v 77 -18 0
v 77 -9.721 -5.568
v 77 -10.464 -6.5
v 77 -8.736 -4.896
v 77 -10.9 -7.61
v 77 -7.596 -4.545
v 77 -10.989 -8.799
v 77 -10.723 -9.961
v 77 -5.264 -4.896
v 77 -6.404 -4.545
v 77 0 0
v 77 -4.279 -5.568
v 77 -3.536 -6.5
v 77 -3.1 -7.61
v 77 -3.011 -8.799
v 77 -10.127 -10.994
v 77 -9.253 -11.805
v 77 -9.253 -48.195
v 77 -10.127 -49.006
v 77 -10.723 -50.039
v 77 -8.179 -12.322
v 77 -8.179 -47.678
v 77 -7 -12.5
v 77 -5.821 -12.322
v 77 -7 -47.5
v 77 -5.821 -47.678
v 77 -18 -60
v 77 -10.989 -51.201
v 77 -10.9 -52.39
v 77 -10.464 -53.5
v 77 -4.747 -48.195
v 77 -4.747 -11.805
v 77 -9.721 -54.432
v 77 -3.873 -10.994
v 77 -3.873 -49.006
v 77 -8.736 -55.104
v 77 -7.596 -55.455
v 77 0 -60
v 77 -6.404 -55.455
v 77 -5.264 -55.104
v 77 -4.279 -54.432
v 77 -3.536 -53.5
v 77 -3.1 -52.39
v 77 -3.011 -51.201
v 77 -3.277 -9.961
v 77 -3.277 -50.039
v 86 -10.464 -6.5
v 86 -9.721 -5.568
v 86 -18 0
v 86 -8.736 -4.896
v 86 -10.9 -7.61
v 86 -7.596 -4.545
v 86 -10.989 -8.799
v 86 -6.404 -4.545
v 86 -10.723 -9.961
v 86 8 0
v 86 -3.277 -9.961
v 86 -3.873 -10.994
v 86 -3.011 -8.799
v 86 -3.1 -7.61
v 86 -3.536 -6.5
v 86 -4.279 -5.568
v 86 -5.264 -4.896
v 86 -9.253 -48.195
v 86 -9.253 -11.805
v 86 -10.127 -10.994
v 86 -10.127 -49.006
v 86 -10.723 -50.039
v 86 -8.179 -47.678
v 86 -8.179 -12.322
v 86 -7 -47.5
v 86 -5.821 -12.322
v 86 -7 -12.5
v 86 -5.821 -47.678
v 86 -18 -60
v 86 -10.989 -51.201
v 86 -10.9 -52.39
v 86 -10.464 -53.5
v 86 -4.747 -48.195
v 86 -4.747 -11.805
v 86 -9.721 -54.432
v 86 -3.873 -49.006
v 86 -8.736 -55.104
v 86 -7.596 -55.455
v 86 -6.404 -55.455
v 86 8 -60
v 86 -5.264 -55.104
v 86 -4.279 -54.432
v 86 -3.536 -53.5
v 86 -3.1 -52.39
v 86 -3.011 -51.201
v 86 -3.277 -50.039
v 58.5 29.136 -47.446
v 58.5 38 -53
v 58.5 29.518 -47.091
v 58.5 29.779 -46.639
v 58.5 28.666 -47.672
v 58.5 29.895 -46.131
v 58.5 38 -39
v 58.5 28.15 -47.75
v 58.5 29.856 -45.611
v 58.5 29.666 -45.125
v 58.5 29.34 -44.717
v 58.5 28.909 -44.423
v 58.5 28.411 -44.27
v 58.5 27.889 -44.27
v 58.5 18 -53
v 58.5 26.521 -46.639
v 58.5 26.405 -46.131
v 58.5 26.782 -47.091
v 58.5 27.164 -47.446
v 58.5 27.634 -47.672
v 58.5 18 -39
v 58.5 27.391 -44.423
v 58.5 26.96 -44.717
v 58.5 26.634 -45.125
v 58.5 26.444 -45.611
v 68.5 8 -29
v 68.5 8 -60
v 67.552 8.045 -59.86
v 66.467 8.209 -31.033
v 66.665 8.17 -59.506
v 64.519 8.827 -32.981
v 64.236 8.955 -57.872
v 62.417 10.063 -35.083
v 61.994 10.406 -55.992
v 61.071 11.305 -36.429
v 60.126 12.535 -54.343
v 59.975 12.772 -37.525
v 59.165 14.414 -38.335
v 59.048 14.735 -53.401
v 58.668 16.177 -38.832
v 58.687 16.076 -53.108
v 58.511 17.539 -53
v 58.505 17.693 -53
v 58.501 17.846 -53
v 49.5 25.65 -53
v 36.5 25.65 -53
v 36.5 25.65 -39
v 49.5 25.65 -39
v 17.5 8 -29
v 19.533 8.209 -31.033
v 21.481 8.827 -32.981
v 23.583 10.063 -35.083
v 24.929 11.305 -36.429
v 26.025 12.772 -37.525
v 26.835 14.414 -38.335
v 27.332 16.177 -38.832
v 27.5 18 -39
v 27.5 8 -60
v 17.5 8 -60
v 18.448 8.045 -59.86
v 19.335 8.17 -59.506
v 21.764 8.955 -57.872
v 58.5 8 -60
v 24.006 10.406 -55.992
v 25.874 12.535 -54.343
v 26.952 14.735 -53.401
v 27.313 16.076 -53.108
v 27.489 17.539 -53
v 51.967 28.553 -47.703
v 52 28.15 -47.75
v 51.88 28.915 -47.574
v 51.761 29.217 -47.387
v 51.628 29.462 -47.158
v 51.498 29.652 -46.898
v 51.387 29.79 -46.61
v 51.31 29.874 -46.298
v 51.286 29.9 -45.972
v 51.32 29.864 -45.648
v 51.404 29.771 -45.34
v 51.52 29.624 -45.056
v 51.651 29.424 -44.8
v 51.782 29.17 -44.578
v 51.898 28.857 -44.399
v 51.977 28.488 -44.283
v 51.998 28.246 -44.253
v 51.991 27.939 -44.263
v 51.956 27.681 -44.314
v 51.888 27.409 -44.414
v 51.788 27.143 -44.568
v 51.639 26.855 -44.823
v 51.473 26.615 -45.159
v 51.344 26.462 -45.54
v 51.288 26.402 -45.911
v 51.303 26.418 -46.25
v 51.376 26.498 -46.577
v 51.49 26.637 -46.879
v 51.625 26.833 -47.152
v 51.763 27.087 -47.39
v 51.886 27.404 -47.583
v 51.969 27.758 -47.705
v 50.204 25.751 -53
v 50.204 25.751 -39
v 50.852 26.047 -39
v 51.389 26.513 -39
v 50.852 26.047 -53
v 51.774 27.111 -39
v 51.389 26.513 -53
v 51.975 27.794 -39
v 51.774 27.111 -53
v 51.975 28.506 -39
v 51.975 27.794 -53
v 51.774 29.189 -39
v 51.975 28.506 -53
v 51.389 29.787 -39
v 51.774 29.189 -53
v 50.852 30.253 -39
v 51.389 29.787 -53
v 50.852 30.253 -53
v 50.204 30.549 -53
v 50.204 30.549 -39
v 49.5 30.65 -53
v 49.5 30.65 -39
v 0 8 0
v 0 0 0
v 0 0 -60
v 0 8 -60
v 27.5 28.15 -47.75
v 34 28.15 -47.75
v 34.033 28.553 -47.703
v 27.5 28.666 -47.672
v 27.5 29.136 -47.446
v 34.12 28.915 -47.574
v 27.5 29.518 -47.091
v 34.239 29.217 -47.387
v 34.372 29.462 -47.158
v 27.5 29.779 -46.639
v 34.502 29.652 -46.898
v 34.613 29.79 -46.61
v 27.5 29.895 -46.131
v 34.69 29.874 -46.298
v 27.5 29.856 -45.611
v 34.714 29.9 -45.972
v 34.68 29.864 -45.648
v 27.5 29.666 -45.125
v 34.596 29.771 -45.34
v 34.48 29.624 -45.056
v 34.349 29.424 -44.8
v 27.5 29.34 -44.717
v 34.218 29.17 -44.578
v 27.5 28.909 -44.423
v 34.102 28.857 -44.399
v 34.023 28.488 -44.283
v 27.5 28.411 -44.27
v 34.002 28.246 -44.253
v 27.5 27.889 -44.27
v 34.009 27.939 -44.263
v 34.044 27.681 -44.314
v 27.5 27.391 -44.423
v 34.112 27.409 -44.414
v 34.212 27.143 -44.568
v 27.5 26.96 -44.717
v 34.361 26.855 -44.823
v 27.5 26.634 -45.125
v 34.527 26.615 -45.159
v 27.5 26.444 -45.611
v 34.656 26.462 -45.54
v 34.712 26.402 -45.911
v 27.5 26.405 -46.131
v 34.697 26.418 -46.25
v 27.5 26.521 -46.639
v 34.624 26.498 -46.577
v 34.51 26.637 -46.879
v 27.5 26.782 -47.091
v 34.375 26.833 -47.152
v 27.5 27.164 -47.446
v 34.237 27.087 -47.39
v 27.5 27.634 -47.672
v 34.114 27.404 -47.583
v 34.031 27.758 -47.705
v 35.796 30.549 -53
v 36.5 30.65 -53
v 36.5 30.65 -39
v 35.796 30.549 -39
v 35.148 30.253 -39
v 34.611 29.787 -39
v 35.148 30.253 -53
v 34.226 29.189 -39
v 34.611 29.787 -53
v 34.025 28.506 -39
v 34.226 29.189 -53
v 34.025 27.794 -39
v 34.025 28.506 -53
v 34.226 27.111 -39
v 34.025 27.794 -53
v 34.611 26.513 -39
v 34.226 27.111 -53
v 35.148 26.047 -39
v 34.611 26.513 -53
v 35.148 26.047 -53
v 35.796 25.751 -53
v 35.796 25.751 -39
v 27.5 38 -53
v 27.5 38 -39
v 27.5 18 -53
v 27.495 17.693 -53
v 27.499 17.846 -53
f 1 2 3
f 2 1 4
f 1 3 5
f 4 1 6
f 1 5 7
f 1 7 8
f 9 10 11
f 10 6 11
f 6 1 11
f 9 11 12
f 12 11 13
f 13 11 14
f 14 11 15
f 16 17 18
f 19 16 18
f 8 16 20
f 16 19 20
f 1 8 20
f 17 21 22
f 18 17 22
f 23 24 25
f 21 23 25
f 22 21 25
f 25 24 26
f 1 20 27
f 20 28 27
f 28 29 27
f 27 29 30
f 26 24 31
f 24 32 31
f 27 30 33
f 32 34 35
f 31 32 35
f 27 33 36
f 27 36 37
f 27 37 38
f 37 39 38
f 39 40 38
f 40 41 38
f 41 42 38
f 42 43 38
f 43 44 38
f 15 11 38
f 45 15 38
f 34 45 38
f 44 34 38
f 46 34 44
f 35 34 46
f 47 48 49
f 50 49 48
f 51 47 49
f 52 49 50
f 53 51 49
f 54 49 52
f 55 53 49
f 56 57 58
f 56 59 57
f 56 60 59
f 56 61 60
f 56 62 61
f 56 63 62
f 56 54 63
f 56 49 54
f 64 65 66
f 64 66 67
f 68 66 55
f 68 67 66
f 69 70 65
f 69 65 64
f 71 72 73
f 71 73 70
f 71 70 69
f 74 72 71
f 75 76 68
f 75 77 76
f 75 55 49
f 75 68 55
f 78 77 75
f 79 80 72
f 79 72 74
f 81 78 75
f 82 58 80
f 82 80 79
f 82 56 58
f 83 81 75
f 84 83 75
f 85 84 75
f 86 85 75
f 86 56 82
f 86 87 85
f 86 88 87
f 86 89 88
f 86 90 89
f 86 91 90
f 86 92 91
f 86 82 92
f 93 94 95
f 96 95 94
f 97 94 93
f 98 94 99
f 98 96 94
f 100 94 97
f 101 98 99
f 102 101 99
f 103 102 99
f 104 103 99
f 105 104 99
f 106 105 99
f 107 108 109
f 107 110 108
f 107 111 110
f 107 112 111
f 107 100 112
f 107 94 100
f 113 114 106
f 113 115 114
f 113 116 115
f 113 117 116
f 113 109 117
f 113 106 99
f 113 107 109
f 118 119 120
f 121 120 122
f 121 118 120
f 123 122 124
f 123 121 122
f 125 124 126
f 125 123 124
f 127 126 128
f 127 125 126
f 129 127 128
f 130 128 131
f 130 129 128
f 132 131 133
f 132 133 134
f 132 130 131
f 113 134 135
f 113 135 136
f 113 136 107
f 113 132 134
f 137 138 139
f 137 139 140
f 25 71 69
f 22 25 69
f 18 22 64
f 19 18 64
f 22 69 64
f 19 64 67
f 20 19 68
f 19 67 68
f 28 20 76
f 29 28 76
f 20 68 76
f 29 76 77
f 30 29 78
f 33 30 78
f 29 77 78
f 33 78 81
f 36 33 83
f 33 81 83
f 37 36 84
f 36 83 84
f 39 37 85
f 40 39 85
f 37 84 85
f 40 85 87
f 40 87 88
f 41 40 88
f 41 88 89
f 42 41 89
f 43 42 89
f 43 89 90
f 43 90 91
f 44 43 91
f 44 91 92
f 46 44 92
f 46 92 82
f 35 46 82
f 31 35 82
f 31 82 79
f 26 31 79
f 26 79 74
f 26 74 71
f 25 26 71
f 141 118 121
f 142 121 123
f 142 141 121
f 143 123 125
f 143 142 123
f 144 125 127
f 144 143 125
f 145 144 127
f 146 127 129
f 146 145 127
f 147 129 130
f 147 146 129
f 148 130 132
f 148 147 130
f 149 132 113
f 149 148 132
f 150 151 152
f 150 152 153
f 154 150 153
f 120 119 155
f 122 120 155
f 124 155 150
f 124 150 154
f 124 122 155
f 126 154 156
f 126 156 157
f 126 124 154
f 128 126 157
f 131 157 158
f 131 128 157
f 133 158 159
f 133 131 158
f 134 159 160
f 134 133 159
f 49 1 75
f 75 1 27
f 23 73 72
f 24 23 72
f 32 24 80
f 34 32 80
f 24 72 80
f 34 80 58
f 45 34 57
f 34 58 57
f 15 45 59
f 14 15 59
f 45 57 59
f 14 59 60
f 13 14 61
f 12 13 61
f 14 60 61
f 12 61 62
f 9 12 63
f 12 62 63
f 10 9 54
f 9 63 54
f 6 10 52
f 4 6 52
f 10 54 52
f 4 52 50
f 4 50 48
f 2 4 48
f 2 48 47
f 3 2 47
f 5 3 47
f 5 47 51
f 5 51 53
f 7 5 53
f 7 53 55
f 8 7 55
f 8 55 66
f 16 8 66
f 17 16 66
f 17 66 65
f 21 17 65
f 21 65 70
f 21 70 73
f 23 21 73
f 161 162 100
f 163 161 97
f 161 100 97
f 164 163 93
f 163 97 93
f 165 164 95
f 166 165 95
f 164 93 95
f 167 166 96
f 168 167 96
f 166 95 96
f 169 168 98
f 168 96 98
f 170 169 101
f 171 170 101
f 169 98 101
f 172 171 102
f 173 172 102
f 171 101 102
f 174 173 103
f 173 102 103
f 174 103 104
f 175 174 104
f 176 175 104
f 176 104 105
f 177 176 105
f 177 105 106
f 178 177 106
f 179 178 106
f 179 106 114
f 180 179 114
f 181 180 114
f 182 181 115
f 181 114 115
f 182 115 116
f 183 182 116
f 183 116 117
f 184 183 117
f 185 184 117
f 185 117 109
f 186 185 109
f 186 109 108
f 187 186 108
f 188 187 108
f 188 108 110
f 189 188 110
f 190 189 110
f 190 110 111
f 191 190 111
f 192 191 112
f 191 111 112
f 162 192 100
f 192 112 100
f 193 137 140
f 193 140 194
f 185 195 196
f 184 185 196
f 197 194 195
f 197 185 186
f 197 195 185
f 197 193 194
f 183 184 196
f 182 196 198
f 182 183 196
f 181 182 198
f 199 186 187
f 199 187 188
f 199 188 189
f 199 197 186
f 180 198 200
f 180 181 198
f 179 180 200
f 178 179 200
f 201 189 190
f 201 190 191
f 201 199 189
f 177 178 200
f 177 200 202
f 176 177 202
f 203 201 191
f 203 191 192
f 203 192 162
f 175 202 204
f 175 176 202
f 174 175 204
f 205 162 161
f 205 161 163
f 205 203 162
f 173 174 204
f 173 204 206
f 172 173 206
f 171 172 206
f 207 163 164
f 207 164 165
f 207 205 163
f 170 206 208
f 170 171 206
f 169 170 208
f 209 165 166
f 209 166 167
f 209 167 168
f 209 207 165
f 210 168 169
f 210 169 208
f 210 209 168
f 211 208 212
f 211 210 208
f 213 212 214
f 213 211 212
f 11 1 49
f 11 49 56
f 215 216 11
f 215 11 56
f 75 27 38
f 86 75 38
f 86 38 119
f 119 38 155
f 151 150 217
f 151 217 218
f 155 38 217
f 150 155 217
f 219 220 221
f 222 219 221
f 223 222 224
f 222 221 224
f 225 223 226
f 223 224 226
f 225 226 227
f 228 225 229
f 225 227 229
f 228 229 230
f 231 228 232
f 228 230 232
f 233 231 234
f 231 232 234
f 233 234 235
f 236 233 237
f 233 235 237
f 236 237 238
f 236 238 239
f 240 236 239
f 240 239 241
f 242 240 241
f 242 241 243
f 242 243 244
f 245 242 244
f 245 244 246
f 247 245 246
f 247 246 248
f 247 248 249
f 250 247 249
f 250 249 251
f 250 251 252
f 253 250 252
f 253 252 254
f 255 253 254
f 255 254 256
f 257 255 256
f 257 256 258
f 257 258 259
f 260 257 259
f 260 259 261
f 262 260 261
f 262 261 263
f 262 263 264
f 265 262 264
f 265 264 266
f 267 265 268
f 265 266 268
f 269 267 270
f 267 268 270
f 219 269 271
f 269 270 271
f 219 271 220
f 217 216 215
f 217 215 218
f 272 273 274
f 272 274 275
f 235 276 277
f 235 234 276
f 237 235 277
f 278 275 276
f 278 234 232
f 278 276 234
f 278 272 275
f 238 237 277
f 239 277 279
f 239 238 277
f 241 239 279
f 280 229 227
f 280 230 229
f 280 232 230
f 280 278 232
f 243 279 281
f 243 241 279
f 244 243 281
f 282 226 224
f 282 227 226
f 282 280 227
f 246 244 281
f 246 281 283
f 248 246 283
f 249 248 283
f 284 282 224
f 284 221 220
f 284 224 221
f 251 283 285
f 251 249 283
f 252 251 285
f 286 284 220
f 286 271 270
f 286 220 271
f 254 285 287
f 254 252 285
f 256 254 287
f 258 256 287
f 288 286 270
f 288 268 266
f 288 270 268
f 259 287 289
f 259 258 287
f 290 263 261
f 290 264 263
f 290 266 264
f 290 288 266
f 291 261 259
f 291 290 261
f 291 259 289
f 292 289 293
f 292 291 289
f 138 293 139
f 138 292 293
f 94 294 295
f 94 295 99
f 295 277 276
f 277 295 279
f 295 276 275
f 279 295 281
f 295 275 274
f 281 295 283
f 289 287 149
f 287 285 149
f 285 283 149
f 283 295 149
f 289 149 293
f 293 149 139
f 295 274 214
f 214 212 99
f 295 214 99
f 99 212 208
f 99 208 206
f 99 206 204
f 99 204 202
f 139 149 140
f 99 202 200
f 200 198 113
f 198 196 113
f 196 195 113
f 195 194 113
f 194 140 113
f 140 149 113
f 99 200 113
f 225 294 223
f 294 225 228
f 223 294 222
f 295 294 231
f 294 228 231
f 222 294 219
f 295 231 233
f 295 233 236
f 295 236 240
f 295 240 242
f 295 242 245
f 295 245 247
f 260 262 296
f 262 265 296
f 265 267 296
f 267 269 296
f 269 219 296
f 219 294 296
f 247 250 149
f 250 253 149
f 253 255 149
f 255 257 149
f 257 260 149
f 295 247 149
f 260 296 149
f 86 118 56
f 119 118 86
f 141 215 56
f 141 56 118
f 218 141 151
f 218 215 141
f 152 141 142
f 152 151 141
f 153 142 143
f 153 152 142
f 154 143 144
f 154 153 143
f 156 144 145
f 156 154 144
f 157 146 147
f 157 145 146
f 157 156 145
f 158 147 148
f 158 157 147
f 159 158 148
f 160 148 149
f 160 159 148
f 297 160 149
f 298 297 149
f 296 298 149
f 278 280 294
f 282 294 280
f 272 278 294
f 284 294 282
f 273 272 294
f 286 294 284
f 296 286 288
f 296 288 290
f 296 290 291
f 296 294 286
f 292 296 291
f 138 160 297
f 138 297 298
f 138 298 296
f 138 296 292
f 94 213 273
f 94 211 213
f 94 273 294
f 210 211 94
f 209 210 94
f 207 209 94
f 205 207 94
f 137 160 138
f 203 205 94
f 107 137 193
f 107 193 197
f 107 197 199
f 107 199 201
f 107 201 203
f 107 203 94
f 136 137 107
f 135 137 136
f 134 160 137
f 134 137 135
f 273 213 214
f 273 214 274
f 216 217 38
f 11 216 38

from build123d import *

# Parameters (mm, degrees)
SKETCH1_W                               = 77
SKETCH1_H                               = 60
BOSS_EXTRUDE1_DEPTH                     = 8
SKETCH3_W                               = 60
SKETCH3_H                               = 26
BOSS_EXTRUDE2_DEPTH                     = 9
SKETCH4_R                               = 4
CUT_EXTRUDE2_DEPTH                      = 107.395488626
SKETCH5_W                               = 31
SKETCH5_H                               = 14
BOSS_EXTRUDE3_DEPTH                     = 30
CUT_EXTRUDE3_DEPTH                      = 108.930533215
FILLET1_R                               = 10
SKETCH8_R                               = 1.75
F_3_5MM_SCREW_HOLE_FOR_TENSIONING_DEPTH = 93.012227514


with BuildPart() as part:
    # Sketch1 → Boss-Extrude1 (new body)
    with BuildSketch(Plane(origin=(0, 0, 0), x_dir=(1, 0, 0), z_dir=(0, 1, 0))):
        with Locations((38.5, 30)):
            Rectangle(SKETCH1_W, SKETCH1_H)
    extrude(amount=BOSS_EXTRUDE1_DEPTH)

    # Sketch3 → Boss-Extrude2 (add)
    with BuildSketch(Plane(origin=(77, 0, 0), x_dir=(0, 0, -1), z_dir=(1, 0, 0))):
        with Locations((30, -5)):
            Rectangle(SKETCH3_W, SKETCH3_H)
    extrude(amount=BOSS_EXTRUDE2_DEPTH)

    # Sketch4 → Cut-Extrude2 (cut, through all)
    with BuildSketch(Plane(origin=(86, 0, 0), x_dir=(0, 0, -1), z_dir=(1, 0, 0))):
        with Locations((8.5, -7)):
            Circle(SKETCH4_R)
        with Locations(Location((51.5, -7, 0), (0, 0, 180))):
            Circle(SKETCH4_R)
    extrude(amount=-CUT_EXTRUDE2_DEPTH, mode=Mode.SUBTRACT)

    # Sketch5 → Boss-Extrude3 (add)
    with BuildSketch(Plane(origin=(0, 8, 0), x_dir=(1, 0, 0), z_dir=(0, 1, 0))):
        with Locations((43, 46)):
            Rectangle(SKETCH5_W, SKETCH5_H)
    extrude(amount=BOSS_EXTRUDE3_DEPTH)

    # Sketch6 → Cut-Extrude3 (cut, through all)
    with BuildSketch(Plane(origin=(0, 0, -53), x_dir=(-1, 0, 0), z_dir=(0, 0, -1))):
        with BuildLine():
            Line((-49.500000097, 30.65), (-36.499999903, 30.65))
            ThreePointArc((-36.499999903, 30.65), (-33.999999903, 28.15), (-36.499999903, 25.65))
            Line((-36.499999903, 25.65), (-49.500000097, 25.65))
            ThreePointArc((-49.500000097, 25.65), (-52.000000097, 28.15), (-49.500000097, 30.65))
        make_face()
    extrude(amount=-CUT_EXTRUDE3_DEPTH, mode=Mode.SUBTRACT)

    # Fillet1
    # the kernel refuses this fillet: 10 mm, written as the material it adds along each edge
    with BuildSketch(Plane(origin=(58.5, 8, -53), x_dir=(0, 0, -1), z_dir=(-1, 0, 0))) as fillet1_piece_1:
        with BuildLine():
            CenterArc((10, -9.539392014), FILLET1_R, 107.457603124, 72.542396876)
            Line((0, -9.539392014), (-0.2, -9.539392014))
            Line((-0.2, -9.539392014), (-0.2, 0))
            Line((-0.2, 0), (0, 0.2))
            ThreePointArc((0, 0.2), (3.5, 0.2), (6.94, 0.19078784))
            Line((6.94, 0.19078784), (7, 0))
        make_face()
    extrude(amount=31)
    with BuildSketch(Plane(origin=(27.5, 8, -53), x_dir=(-1, 0, 0), z_dir=(0, 0, 1)), Plane(origin=(58.5, 8, -39), x_dir=(1, 0, 0), z_dir=(0, 0, -1))) as fillet1_piece_2:
        with BuildLine():
            CenterArc((FILLET1_R, -FILLET1_R), FILLET1_R, 90, 90)
            Line((0, -FILLET1_R), (-FILLET1_R * 0.02, -FILLET1_R))
            Line((-FILLET1_R * 0.02, -FILLET1_R), (-FILLET1_R * 0.02, FILLET1_R * 0.02))
            Line((-FILLET1_R * 0.02, FILLET1_R * 0.02), (FILLET1_R, FILLET1_R * 0.02))
            Line((FILLET1_R, FILLET1_R * 0.02), (FILLET1_R, 0))
        make_face()
    extrude(amount=14)
    with BuildSketch(Plane(origin=(27.5, 8, -39), x_dir=(0, 0, 1), z_dir=(1, 0, 0))) as fillet1_piece_3:
        with BuildLine():
            CenterArc((FILLET1_R, -FILLET1_R), FILLET1_R, 90, 90)
            Line((0, -FILLET1_R), (-FILLET1_R * 0.02, -FILLET1_R))
            Line((-FILLET1_R * 0.02, -FILLET1_R), (-FILLET1_R * 0.02, FILLET1_R * 0.02))
            Line((-FILLET1_R * 0.02, FILLET1_R * 0.02), (FILLET1_R, FILLET1_R * 0.02))
            Line((FILLET1_R, FILLET1_R * 0.02), (FILLET1_R, 0))
        make_face()
    extrude(amount=31)
    with BuildSketch(Plane(origin=(82.348480035, 8, -53), x_dir=(0, 0, -1), z_dir=(-1, 0, 0))) as fillet1_piece_4a_section:
        with BuildLine():
            CenterArc((10, -9.539392014), FILLET1_R, 107.457603124, 72.542396876)
            Line((0, -9.539392014), (-0.2, -9.539392014))
            Line((-0.2, -9.539392014), (-0.2, 0))
            Line((-0.2, 0), (0, 0.2))
            ThreePointArc((0, 0.2), (3.5, 0.2), (6.94, 0.19078784))
            Line((6.94, 0.19078784), (7, 0))
        make_face()
    fillet1_piece_4a = extrude(amount=54.848480035, mode=Mode.PRIVATE)
    fillet1_piece_4a = split(fillet1_piece_4a, bisect_by=Plane(origin=(58.5, 10.271225878, -54.787817996), z_dir=(1, 0, 0)), keep=Keep.TOP, mode=Mode.PRIVATE)
    with BuildSketch(Plane(origin=(58.5, 8, -39), x_dir=(1, 0, 0), z_dir=(0, 0, -1))) as fillet1_piece_4b_section:
        with BuildLine():
            CenterArc((FILLET1_R, -FILLET1_R), FILLET1_R, 90, 90)
            Line((0, -FILLET1_R), (-FILLET1_R * 0.02, -FILLET1_R))
            Line((-FILLET1_R * 0.02, -FILLET1_R), (-FILLET1_R * 0.02, FILLET1_R * 0.02))
            Line((-FILLET1_R * 0.02, FILLET1_R * 0.02), (FILLET1_R, FILLET1_R * 0.02))
            Line((FILLET1_R, FILLET1_R * 0.02), (FILLET1_R, 0))
        make_face()
    fillet1_piece_4b = extrude(amount=39, mode=Mode.PRIVATE)
    fillet1_piece_4b = split(fillet1_piece_4b, bisect_by=Plane(origin=(60.763951143, 10.263951143, -60), z_dir=(0, 0, 1)), keep=Keep.TOP, mode=Mode.PRIVATE)
    fillet1_piece_4b = split(fillet1_piece_4b, bisect_by=Plane(origin=(60.763951143, 10.263951143, -53), z_dir=(0, 0, -1)), keep=Keep.TOP, mode=Mode.PRIVATE)
    fillet1_piece_4 = fillet1_piece_4a & fillet1_piece_4b
    add(fillet1_piece_4)
    with BuildSketch(Plane(origin=(58.5, 8, -53), x_dir=(0, 0, -1), z_dir=(-1, 0, 0))) as fillet1_piece_5a_section:
        with BuildLine():
            CenterArc((10, -9.539392014), FILLET1_R, 107.457603124, 72.542396876)
            Line((0, -9.539392014), (-0.2, -9.539392014))
            Line((-0.2, -9.539392014), (-0.2, 0))
            Line((-0.2, 0), (0, 0.2))
            ThreePointArc((0, 0.2), (3.5, 0.2), (6.94, 0.19078784))
            Line((6.94, 0.19078784), (7, 0))
        make_face()
    fillet1_piece_5a = extrude(amount=54.848480035, mode=Mode.PRIVATE)
    fillet1_piece_5a = split(fillet1_piece_5a, bisect_by=Plane(origin=(27.5, 10.271225878, -54.787817996), z_dir=(-1, 0, 0)), keep=Keep.TOP, mode=Mode.PRIVATE)
    with BuildSketch(Plane(origin=(27.5, 8, -78), x_dir=(-1, 0, 0), z_dir=(0, 0, 1))) as fillet1_piece_5b_section:
        with BuildLine():
            CenterArc((FILLET1_R, -FILLET1_R), FILLET1_R, 90, 90)
            Line((0, -FILLET1_R), (-FILLET1_R * 0.02, -FILLET1_R))
            Line((-FILLET1_R * 0.02, -FILLET1_R), (-FILLET1_R * 0.02, FILLET1_R * 0.02))
            Line((-FILLET1_R * 0.02, FILLET1_R * 0.02), (FILLET1_R, FILLET1_R * 0.02))
            Line((FILLET1_R, FILLET1_R * 0.02), (FILLET1_R, 0))
        make_face()
    fillet1_piece_5b = extrude(amount=39, mode=Mode.PRIVATE)
    fillet1_piece_5b = split(fillet1_piece_5b, bisect_by=Plane(origin=(25.236048857, 10.263951143, -60), z_dir=(0, 0, 1)), keep=Keep.TOP, mode=Mode.PRIVATE)
    fillet1_piece_5b = split(fillet1_piece_5b, bisect_by=Plane(origin=(25.236048857, 10.263951143, -53), z_dir=(0, 0, -1)), keep=Keep.TOP, mode=Mode.PRIVATE)
    fillet1_piece_5 = fillet1_piece_5a & fillet1_piece_5b
    add(fillet1_piece_5)
    with BuildSketch(Plane(origin=(27.5, 8, -53), x_dir=(-1, 0, 0), z_dir=(0, 0, 1))) as fillet1_piece_6a_section:
        with BuildLine():
            CenterArc((FILLET1_R, -FILLET1_R), FILLET1_R, 90, 90)
            Line((0, -FILLET1_R), (-FILLET1_R * 0.02, -FILLET1_R))
            Line((-FILLET1_R * 0.02, -FILLET1_R), (-FILLET1_R * 0.02, FILLET1_R * 0.02))
            Line((-FILLET1_R * 0.02, FILLET1_R * 0.02), (FILLET1_R, FILLET1_R * 0.02))
            Line((FILLET1_R, FILLET1_R * 0.02), (FILLET1_R, 0))
        make_face()
    fillet1_piece_6a = extrude(amount=39, mode=Mode.PRIVATE)
    fillet1_piece_6a = split(fillet1_piece_6a, bisect_by=Plane(origin=(25.236048857, 10.263951143, -39), z_dir=(0, 0, 1)), keep=Keep.TOP, mode=Mode.PRIVATE)
    with BuildSketch(Plane(origin=(2.5, 8, -39), x_dir=(0, 0, 1), z_dir=(1, 0, 0))) as fillet1_piece_6b_section:
        with BuildLine():
            CenterArc((FILLET1_R, -FILLET1_R), FILLET1_R, 90, 90)
            Line((0, -FILLET1_R), (-FILLET1_R * 0.02, -FILLET1_R))
            Line((-FILLET1_R * 0.02, -FILLET1_R), (-FILLET1_R * 0.02, FILLET1_R * 0.02))
            Line((-FILLET1_R * 0.02, FILLET1_R * 0.02), (FILLET1_R, FILLET1_R * 0.02))
            Line((FILLET1_R, FILLET1_R * 0.02), (FILLET1_R, 0))
        make_face()
    fillet1_piece_6b = extrude(amount=56, mode=Mode.PRIVATE)
    fillet1_piece_6b = split(fillet1_piece_6b, bisect_by=Plane(origin=(27.5, 10.263951143, -36.736048857), z_dir=(-1, 0, 0)), keep=Keep.TOP, mode=Mode.PRIVATE)
    fillet1_piece_6 = fillet1_piece_6a & fillet1_piece_6b
    add(fillet1_piece_6)
    with BuildSketch(Plane(origin=(27.5, 8, -39), x_dir=(0, 0, 1), z_dir=(1, 0, 0))) as fillet1_piece_7a_section:
        with BuildLine():
            CenterArc((FILLET1_R, -FILLET1_R), FILLET1_R, 90, 90)
            Line((0, -FILLET1_R), (-FILLET1_R * 0.02, -FILLET1_R))
            Line((-FILLET1_R * 0.02, -FILLET1_R), (-FILLET1_R * 0.02, FILLET1_R * 0.02))
            Line((-FILLET1_R * 0.02, FILLET1_R * 0.02), (FILLET1_R, FILLET1_R * 0.02))
            Line((FILLET1_R, FILLET1_R * 0.02), (FILLET1_R, 0))
        make_face()
    fillet1_piece_7a = extrude(amount=56, mode=Mode.PRIVATE)
    fillet1_piece_7a = split(fillet1_piece_7a, bisect_by=Plane(origin=(58.5, 10.263951143, -36.736048857), z_dir=(1, 0, 0)), keep=Keep.TOP, mode=Mode.PRIVATE)
    with BuildSketch(Plane(origin=(58.5, 8, -14), x_dir=(1, 0, 0), z_dir=(0, 0, -1))) as fillet1_piece_7b_section:
        with BuildLine():
            CenterArc((FILLET1_R, -FILLET1_R), FILLET1_R, 90, 90)
            Line((0, -FILLET1_R), (-FILLET1_R * 0.02, -FILLET1_R))
            Line((-FILLET1_R * 0.02, -FILLET1_R), (-FILLET1_R * 0.02, FILLET1_R * 0.02))
            Line((-FILLET1_R * 0.02, FILLET1_R * 0.02), (FILLET1_R, FILLET1_R * 0.02))
            Line((FILLET1_R, FILLET1_R * 0.02), (FILLET1_R, 0))
        make_face()
    fillet1_piece_7b = extrude(amount=39, mode=Mode.PRIVATE)
    fillet1_piece_7b = split(fillet1_piece_7b, bisect_by=Plane(origin=(60.763951143, 10.263951143, -39), z_dir=(0, 0, 1)), keep=Keep.TOP, mode=Mode.PRIVATE)
    fillet1_piece_7 = fillet1_piece_7a & fillet1_piece_7b
    add(fillet1_piece_7)

    # Sketch8 → 3.5mm screw hole for tensioning (cut, through all)
    with BuildSketch(Plane(origin=(58.5, 0, 0), x_dir=(0, 0, -1), z_dir=(1, 0, 0))):
        with Locations((46, 28.15)):
            Circle(SKETCH8_R)
    extrude(amount=-F_3_5MM_SCREW_HOLE_FOR_TENSIONING_DEPTH, mode=Mode.SUBTRACT)


solid = part.part
